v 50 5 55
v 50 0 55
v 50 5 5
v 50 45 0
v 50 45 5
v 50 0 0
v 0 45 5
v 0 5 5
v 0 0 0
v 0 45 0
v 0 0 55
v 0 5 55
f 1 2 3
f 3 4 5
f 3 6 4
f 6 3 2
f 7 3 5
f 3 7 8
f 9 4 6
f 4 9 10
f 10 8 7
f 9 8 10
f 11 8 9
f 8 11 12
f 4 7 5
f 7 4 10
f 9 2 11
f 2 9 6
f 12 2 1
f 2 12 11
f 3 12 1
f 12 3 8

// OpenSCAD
// === NEMA 17 Stepper Motor Mounting Bracket ===
// Print orientation: base plate on bed (XY plane at z=0)

// --- Base plate dimensions ---
base_x_half = 25;        // Half-width in X (x: -25 to 25)
base_y = 45;             // Depth in Y (y: 0 to 45)
base_z = 5;              // Height/thickness in Z (z: 0 to 5)

// --- Base plate mounting holes (M4, 4.5 mm dia) ---
m4_dia = 4.5;
m4_x = 17;               // X position of holes
m4_y = 30;               // Y position of holes

// --- Vertical motor plate dimensions ---
motor_plate_x_half = 25; // Half-width in X (x: -25 to 25)
motor_plate_y = 5;       // Depth in Y (y: 0 to 5)
motor_plate_z = 50;      // Height in Z (z: 0 to 50)

// --- Motor centring boss hole ---
boss_dia = 23;            // Diameter of centring boss hole
boss_x = 0;               // X centre
boss_z = 28;              // Z centre

// --- Motor mounting holes (M3, 3.4 mm dia) on 31 mm square pattern ---
m3_dia = 3.4;
m3_pattern = 31;           // Square pattern size (31 mm)
m3_half = m3_pattern / 2; // Half of pattern size

// --- Triangular gussets ---
gusset_thickness = 5;     // Thickness in X (flush with edges)
gusset_leg_y = 20;        // Leg along +Y
gusset_leg_z = 20;        // Leg along +Z
gusset_corner_y = 5;       // Y of right-angle corner (where plates meet)
gusset_corner_z = 5;       // Z of right-angle corner

// --- Global fineness for round holes ---
$fn = 64;

// --- Build the part ---
module bracket() {
    // Main body: base plate + vertical motor plate
    union() {
        // Base plate
        cube([2 * base_x_half, base_y, base_z], center = [0, 0, 0]);
        
        // Vertical motor plate (standing on back edge of base at y=0)
        translate([0, 0, base_z]) {
            cube([2 * motor_plate_x_half, motor_plate_y, motor_plate_z], center = [0, 0, 0]);
        }
    }
    
    // Triangular gussets (in YZ plane, thickness in X)
    for (x_start = [-base_x_half, base_x_half - gusset_thickness]) {
        translate([x_start, gusset_corner_y, gusset_corner_z]) {
            // Create a 3D triangle by extruding a 2D triangle in the X direction
            linear_extrude(height = gusset_thickness, center = false) {
                // Triangle in YZ plane (which becomes XY after rotation)
                rotate([90, 0, 0]) {
                    polygon([[0, 0], [gusset_leg_y, 0], [0, gusset_leg_z]]);
                }
            }
        }
    }
    
    // Cut holes
    difference() {
        // Re-create the full body
        union() {
            cube([2 * base_x_half, base_y, base_z], center = [0, 0, 0]);
            translate([0, 0, base_z]) {
                cube([2 * motor_plate_x_half, motor_plate_y, motor_plate_z], center = [0, 0, 0]);
            }
            
            // Add gussets
            for (x_start = [-base_x_half, base_x_half - gusset_thickness]) {
                translate([x_start, gusset_corner_y, gusset_corner_z]) {
                    linear_extrude(height = gusset_thickness, center = false) {
                        rotate([90, 0, 0]) {
                            polygon([[0, 0], [gusset_leg_y, 0], [0, gusset_leg_z]]);
                        }
                    }
                }
            }
        }
        
        // M4 holes through base plate (extend past both faces)
        for (x_off = [-m4_x, m4_x]) {
            translate([x_off, m4_y, -0.5]) {
                cylinder(d = m4_dia, h = base_z + 1, center = true);
            }
        }
        
        // Boss hole through motor plate (along Y, extend past front/back)
        translate([boss_x, 0, boss_z]) {
            cylinder(d = boss_dia, h = motor_plate_y + 1, center = true, axis = [0, 1, 0]);
        }
        
        // M3 mounting holes through motor plate (along Y)
        for (x_off = [-m3_half, m3_half]) {
            for (z_off = [-m3_half, m3_half]) {
                translate([x_off, 0, boss_z + z_off]) {
                    cylinder(d = m3_dia, h = motor_plate_y + 1, center = true, axis = [0, 1, 0]);
                }
            }
        }
    }
}

bracket();
